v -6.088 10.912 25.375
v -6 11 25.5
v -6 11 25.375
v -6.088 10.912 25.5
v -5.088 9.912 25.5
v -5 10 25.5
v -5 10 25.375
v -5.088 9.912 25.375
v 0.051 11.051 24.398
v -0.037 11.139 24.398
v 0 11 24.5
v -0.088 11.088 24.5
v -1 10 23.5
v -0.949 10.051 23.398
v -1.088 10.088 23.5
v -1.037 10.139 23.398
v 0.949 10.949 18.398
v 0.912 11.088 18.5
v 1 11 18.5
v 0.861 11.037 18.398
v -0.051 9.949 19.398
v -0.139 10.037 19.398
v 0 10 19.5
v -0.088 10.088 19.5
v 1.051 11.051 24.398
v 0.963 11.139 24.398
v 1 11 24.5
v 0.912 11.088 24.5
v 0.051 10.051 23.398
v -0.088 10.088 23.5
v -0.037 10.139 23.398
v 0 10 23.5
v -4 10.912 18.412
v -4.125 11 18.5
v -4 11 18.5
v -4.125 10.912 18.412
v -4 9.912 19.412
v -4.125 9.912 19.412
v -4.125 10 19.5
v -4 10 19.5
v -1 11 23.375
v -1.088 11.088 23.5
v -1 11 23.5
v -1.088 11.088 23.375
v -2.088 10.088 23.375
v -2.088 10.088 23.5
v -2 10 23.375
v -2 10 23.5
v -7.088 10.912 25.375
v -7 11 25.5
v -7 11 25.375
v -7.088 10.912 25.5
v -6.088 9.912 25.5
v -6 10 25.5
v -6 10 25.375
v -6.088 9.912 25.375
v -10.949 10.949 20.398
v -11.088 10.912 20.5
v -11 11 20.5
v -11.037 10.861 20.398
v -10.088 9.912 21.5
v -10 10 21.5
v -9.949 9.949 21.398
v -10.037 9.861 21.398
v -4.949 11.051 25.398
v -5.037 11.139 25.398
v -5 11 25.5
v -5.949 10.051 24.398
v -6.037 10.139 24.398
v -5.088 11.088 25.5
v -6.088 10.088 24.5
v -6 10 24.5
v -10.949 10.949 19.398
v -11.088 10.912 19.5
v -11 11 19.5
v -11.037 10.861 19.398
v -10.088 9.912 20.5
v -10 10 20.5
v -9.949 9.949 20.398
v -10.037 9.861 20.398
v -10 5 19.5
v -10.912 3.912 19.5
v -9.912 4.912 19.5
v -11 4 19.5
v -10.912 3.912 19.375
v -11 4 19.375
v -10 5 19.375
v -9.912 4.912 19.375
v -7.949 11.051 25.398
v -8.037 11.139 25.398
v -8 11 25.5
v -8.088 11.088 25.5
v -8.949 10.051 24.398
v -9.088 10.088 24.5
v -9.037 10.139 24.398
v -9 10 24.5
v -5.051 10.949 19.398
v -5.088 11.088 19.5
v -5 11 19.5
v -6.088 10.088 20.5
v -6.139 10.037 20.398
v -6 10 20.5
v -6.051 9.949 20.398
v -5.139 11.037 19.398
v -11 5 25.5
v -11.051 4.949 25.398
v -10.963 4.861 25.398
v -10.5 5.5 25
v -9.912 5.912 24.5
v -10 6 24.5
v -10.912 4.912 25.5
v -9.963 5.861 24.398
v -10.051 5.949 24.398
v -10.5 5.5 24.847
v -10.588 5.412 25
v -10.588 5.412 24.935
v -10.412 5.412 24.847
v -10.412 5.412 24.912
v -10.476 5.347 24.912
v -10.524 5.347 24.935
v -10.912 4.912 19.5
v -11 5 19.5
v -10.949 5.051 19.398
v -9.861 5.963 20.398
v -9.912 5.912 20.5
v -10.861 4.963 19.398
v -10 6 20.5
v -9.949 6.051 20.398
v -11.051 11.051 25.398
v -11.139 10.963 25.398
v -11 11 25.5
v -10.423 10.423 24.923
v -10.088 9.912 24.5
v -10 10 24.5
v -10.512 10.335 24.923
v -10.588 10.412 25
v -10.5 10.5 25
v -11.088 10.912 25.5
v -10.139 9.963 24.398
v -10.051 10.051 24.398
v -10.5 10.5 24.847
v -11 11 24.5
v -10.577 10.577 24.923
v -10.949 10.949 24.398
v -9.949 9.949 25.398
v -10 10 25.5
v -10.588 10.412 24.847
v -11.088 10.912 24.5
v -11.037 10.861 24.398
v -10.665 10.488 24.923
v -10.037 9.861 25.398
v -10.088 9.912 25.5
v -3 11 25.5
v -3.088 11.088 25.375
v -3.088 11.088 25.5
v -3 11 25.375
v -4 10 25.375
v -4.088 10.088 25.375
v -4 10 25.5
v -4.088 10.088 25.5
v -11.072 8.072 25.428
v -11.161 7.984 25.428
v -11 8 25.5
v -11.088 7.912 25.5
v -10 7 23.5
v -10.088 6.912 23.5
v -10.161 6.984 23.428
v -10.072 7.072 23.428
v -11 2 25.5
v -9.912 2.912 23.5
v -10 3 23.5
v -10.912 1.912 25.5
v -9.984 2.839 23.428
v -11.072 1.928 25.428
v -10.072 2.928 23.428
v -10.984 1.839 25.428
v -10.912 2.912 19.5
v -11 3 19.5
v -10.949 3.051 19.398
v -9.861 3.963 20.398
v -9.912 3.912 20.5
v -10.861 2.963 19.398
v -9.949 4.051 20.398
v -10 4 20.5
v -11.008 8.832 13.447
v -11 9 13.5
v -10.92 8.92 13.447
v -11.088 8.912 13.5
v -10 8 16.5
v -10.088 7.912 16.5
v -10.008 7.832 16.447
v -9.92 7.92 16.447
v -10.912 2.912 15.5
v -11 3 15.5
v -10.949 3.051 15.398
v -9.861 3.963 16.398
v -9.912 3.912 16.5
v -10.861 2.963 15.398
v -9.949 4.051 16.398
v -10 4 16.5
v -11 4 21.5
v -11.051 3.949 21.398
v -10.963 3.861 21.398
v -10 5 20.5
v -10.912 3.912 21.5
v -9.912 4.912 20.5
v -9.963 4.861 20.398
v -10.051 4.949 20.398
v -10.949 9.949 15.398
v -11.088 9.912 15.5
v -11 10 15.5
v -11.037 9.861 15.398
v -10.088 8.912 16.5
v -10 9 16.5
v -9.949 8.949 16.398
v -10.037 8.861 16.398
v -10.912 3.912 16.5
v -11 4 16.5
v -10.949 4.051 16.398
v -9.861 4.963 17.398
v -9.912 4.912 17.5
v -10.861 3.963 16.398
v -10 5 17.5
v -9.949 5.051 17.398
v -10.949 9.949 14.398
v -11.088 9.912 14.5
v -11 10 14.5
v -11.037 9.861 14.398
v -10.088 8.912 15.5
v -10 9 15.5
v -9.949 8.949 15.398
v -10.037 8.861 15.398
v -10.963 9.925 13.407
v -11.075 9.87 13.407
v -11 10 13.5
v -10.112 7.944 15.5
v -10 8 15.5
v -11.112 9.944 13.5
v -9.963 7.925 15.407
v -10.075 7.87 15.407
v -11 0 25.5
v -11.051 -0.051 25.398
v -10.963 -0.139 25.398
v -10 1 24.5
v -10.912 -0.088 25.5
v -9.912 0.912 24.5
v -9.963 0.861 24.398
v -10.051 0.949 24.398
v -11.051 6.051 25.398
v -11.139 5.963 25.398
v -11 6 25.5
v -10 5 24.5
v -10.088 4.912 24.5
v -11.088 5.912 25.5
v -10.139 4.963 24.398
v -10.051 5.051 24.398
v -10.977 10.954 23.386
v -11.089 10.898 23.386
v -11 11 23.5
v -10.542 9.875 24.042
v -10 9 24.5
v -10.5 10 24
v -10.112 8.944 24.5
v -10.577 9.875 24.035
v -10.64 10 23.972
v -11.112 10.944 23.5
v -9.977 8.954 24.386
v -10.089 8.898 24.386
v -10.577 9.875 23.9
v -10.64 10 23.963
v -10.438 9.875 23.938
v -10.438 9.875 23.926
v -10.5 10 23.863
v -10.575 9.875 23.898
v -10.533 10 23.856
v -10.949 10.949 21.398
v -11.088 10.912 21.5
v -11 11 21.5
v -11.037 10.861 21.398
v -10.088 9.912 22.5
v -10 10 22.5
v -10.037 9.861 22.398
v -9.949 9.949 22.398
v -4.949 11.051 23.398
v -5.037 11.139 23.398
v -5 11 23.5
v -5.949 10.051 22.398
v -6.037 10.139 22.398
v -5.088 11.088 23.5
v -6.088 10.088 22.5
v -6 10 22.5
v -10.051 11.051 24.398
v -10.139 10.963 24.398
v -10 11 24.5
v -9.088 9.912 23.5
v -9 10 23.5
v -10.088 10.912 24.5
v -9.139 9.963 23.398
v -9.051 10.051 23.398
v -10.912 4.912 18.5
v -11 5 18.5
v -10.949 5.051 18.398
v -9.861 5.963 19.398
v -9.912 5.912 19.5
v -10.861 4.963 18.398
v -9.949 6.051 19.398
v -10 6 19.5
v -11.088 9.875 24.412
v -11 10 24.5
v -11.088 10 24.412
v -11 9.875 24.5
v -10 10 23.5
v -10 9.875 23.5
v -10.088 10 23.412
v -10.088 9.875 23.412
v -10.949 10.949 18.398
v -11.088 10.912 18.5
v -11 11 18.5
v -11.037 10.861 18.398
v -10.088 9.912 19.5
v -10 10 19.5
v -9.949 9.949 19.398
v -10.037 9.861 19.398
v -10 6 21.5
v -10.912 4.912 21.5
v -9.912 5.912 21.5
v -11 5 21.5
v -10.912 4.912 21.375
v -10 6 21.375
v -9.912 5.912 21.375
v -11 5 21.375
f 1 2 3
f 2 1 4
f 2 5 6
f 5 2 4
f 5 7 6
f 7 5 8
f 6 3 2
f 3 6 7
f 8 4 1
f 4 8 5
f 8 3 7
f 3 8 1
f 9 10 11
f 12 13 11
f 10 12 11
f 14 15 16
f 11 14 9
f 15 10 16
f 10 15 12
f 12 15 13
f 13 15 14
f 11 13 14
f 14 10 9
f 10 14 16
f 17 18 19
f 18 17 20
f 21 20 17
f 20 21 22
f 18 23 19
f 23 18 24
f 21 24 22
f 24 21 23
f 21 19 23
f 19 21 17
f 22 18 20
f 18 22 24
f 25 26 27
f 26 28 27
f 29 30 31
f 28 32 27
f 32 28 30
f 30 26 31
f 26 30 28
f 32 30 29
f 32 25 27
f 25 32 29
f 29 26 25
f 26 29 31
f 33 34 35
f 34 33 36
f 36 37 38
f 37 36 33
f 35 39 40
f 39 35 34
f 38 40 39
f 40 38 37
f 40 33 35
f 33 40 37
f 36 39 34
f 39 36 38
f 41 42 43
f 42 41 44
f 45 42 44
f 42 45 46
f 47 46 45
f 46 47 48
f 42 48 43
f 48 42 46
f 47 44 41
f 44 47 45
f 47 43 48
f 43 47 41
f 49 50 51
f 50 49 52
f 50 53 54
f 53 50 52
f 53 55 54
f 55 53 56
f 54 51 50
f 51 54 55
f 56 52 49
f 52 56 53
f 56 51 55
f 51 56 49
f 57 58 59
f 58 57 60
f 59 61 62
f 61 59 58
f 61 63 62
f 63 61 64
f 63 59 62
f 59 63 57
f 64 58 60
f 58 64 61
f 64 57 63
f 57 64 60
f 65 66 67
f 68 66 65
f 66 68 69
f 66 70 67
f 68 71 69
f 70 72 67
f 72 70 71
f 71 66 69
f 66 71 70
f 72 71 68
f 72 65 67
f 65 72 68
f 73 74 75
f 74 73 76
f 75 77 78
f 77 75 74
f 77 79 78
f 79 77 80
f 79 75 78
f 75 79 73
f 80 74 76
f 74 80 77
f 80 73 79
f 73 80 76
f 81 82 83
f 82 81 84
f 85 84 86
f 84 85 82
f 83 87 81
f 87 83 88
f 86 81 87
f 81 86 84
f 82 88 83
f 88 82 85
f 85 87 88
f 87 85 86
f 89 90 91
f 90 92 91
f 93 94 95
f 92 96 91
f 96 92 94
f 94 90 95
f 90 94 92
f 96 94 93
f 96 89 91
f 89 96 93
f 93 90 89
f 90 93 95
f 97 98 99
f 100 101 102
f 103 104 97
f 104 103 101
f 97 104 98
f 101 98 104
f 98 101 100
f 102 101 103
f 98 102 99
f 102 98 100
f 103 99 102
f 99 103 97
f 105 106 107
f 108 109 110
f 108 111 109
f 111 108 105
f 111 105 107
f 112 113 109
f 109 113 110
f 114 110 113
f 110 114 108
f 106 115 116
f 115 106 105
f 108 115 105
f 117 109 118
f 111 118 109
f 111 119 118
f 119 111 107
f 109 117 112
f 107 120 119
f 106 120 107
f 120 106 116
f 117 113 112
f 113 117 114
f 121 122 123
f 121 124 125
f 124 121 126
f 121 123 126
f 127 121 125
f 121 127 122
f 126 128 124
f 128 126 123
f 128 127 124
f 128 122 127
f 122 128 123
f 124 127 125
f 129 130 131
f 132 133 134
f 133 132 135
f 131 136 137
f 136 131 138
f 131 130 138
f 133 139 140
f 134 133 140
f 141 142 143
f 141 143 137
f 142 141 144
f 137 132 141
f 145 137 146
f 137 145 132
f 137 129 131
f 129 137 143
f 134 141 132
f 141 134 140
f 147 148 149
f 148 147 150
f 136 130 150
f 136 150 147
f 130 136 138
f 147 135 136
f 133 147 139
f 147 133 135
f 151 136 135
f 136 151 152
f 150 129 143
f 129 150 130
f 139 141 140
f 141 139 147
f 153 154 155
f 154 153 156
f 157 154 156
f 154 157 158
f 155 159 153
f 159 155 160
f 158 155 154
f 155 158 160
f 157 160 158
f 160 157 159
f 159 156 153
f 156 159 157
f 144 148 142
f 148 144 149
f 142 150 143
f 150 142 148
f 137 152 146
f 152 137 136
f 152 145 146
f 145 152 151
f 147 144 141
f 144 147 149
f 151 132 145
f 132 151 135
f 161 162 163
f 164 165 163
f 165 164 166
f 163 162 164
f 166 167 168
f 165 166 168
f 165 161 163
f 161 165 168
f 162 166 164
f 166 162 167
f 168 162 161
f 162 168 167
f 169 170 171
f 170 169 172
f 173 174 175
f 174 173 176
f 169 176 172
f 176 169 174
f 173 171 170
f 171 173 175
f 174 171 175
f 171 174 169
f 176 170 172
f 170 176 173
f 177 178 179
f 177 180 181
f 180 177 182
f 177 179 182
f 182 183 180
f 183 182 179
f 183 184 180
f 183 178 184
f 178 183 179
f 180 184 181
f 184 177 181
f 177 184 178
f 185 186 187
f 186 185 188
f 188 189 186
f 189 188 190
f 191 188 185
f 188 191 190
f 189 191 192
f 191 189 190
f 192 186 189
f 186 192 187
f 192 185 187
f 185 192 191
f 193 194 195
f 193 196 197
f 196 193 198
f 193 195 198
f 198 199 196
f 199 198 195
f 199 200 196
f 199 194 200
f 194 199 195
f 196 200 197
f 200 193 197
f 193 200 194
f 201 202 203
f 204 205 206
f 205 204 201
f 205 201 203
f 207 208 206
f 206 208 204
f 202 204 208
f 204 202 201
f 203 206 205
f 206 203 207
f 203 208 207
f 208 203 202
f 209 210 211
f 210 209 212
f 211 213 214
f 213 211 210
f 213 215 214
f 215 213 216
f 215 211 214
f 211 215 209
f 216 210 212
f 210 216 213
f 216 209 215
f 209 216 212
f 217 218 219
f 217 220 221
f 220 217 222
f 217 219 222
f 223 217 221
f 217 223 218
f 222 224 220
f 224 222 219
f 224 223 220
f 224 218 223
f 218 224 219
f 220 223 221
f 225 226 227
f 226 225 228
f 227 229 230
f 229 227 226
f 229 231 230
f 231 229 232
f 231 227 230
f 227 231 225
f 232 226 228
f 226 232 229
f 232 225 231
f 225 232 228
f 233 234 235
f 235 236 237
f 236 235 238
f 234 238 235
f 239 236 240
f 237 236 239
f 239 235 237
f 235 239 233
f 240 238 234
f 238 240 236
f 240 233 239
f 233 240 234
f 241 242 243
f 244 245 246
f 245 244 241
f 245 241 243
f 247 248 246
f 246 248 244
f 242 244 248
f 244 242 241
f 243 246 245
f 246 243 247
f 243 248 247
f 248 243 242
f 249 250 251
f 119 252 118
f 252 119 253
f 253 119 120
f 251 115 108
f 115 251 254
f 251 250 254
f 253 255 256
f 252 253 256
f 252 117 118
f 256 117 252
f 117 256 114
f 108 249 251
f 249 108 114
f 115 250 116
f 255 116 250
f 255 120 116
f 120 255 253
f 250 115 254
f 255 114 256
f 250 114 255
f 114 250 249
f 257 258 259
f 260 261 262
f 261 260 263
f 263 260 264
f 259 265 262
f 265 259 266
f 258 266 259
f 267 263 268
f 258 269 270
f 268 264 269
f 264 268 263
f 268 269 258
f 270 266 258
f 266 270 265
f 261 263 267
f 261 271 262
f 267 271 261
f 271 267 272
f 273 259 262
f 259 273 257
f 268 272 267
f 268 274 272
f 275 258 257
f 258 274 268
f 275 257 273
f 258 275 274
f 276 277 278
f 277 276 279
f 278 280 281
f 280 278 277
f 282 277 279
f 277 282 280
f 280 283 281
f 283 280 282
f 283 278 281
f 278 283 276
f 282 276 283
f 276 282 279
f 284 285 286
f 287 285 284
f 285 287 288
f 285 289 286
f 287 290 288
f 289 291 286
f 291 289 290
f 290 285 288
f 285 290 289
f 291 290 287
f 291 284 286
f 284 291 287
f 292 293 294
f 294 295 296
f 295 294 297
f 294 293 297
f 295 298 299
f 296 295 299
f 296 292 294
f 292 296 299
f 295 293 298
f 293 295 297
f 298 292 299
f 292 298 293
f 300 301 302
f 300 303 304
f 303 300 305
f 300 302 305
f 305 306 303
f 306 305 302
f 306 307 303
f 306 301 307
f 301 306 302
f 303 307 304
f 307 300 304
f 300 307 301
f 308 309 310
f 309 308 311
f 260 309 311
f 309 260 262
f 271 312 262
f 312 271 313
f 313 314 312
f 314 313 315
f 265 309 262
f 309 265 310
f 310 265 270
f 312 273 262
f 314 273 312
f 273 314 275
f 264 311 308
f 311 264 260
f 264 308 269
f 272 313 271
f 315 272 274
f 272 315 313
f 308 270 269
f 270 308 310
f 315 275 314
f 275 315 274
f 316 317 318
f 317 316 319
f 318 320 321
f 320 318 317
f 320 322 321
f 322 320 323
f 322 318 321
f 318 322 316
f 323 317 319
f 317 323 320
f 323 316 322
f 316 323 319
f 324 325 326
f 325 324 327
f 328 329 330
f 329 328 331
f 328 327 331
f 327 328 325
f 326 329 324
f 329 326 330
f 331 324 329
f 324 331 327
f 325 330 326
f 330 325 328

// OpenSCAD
translate(v = [-0.5, -0.5, 0]) {
	/*Shell 0*/
	union() {
		%/*Nodes shell 0*/
		union();
		/*Edges shell 0*/
		union();
	}
	/*Shell 1*/
	union() {
		%/*Nodes shell 1*/
		union() {
			/*Node thingy.ctrl_stage_in_hole*/
			color(alpha = 0.1, c = "green") {
				translate(v = [0, -3, -3]) {
					cube(size = [1, 1, 1]);
				}
			}
			/*Node thingy.ctrl_stage_out_hole*/
			color(alpha = 0.1, c = "green") {
				translate(v = [-3, -3, -3]) {
					cube(size = [1, 1, 1]);
				}
			}
			/*Node thingy.flush_stage_in_hole*/
			color(alpha = 0.1, c = "lightgreen") {
				translate(v = [-1, -3, 1]) {
					cube(size = [1, 1, 1]);
				}
			}
			/*Node thingy.flush_stage_out_hole*/
			color(alpha = 0.1, c = "lightgreen") {
				translate(v = [-3, 0, -7]) {
					cube(size = [1, 1, 1]);
				}
			}
			/*Node $_238__1*/
			color(alpha = 0.1, c = "lightblue") {
				translate(v = [3, -3, -1]) {
					cube(size = [1, 1, 1]);
				}
			}
			/*Node $_228__1*/
			color(alpha = 0.1, c = "lightblue") {
				translate(v = [-3, -3, 10]) {
					cube(size = [1, 1, 1]);
				}
			}
			/*Node $_224__1*/
			color(alpha = 0.1, c = "lightblue") {
				translate(v = [0, 3, -5]) {
					cube(size = [1, 1, 1]);
				}
			}
			/*Node $_68__1*/
			color(alpha = 0.1, c = "lightblue") {
				translate(v = [-3, -3, -4]) {
					cube(size = [1, 1, 1]);
				}
			}
			/*Node $_257__1*/
			color(alpha = 0.1, c = "lightblue") {
				translate(v = [3, -1, 0]) {
					cube(size = [1, 1, 1]);
				}
			}
			/*Node thingy.thingy.chamber[7].first.ring__1*/
			color(alpha = 0.1, c = "lightblue") {
				translate(v = [-2, -3, -5]) {
					cube(size = [1, 1, 1]);
				}
			}
			/*Node $_204__1*/
			color(alpha = 0.1, c = "lightblue") {
				translate(v = [-2, 3, 6]) {
					cube(size = [1, 1, 1]);
				}
			}
			/*Node $_300__1*/
			color(alpha = 0.1, c = "lightblue") {
				translate(v = [-2, -3, 0]) {
					cube(size = [1, 1, 1]);
				}
			}
			/*Node $_190__1*/
			color(alpha = 0.1, c = "lightblue") {
				translate(v = [-3, 3, 6]) {
					cube(size = [1, 1, 1]);
				}
			}
			/*Node $_287__1*/
			color(alpha = 0.1, c = "lightblue") {
				translate(v = [-3, -3, 1]) {
					cube(size = [1, 1, 1]);
				}
			}
			/*Node $_54__1*/
			color(alpha = 0.1, c = "lightblue") {
				translate(v = [-1, -3, -6]) {
					cube(size = [1, 1, 1]);
				}
			}
			/*Node $_242__1*/
			color(alpha = 0.1, c = "lightblue") {
				translate(v = [-1, 3, 5]) {
					cube(size = [1, 1, 1]);
				}
			}
			/*Node $_82__1*/
			color(alpha = 0.1, c = "lightblue") {
				translate(v = [-3, -3, 0]) {
					cube(size = [1, 1, 1]);
				}
			}
			/*Node $_236__1*/
			color(alpha = 0.1, c = "lightblue") {
				translate(v = [-3, 3, 0]) {
					cube(size = [1, 1, 1]);
				}
			}
			/*Node thingy.thingy.chamber[9].first.ring__1*/
			color(alpha = 0.1, c = "lightblue") {
				translate(v = [-3, 3, -2]) {
					cube(size = [1, 1, 1]);
				}
			}
			/*Node thingy.thingy.chamber[6].first.ring__1*/
			color(alpha = 0.1, c = "lightblue") {
				translate(v = [-2, -3, 2]) {
					cube(size = [1, 1, 1]);
				}
			}
			/*Node $_44__1*/
			color(alpha = 0.1, c = "lightblue") {
				translate(v = [3, 2, -2]) {
					cube(size = [1, 1, 1]);
				}
			}
			/*Node $_306__1*/
			color(alpha = 0.1, c = "lightblue") {
				translate(v = [-3, 0, -5]) {
					cube(size = [1, 1, 1]);
				}
			}
			/*Node $_222__1*/
			color(alpha = 0.1, c = "lightblue") {
				translate(v = [-3, -3, 7]) {
					cube(size = [1, 1, 1]);
				}
			}
			/*Node $_260__1*/
			color(alpha = 0.1, c = "lightblue") {
				translate(v = [-3, -2, 6]) {
					cube(size = [1, 1, 1]);
				}
			}
			/*Node $_63__1*/
			color(alpha = 0.1, c = "lightblue") {
				translate(v = [0, 3, -6]) {
					cube(size = [1, 1, 1]);
				}
			}
			/*Node $_51__1*/
			color(alpha = 0.1, c = "lightblue") {
				translate(v = [-1, 3, 1]) {
					cube(size = [1, 1, 1]);
				}
			}
			/*Node $_297__1*/
			color(alpha = 0.1, c = "lightblue") {
				translate(v = [-3, -3, -17]) {
					cube(size = [1, 1, 1]);
				}
			}
			/*Node $_321__1*/
			color(alpha = 0.1, c = "lightblue") {
				translate(v = [1, -3, -3]) {
					cube(size = [1, 1, 1]);
				}
			}
			/*Node $_176__1*/
			color(alpha = 0.1, c = "lightblue") {
				translate(v = [0, -3, 1]) {
					cube(size = [1, 1, 1]);
				}
			}
			/*Node $_64__1*/
			color(alpha = 0.1, c = "lightblue") {
				translate(v = [-2, -3, -14]) {
					cube(size = [1, 1, 1]);
				}
			}
			/*Node $_273__1*/
			color(alpha = 0.1, c = "lightblue") {
				translate(v = [-1, -3, -2]) {
					cube(size = [1, 1, 1]);
				}
			}
			/*Node $_40__1*/
			color(alpha = 0.1, c = "lightblue") {
				translate(v = [3, -3, -14]) {
					cube(size = [1, 1, 1]);
				}
			}
			/*Node $_258__1*/
			color(alpha = 0.1, c = "lightblue") {
				translate(v = [-3, 1, 2]) {
					cube(size = [1, 1, 1]);
				}
			}
			/*Node $_83__1*/
			color(alpha = 0.1, c = "lightblue") {
				translate(v = [-3, -3, -7]) {
					cube(size = [1, 1, 1]);
				}
			}
			/*Node $_267__1*/
			color(alpha = 0.1, c = "lightblue") {
				translate(v = [3, -3, 7]) {
					cube(size = [1, 1, 1]);
				}
			}
			/*Node thingy.thingy.chamber[4].first.ring__1*/
			color(alpha = 0.1, c = "lightblue") {
				translate(v = [-3, -3, -1]) {
					cube(size = [1, 1, 1]);
				}
			}
			/*Node $_304__1*/
			color(alpha = 0.1, c = "lightblue") {
				translate(v = [-3, 3, 1]) {
					cube(size = [1, 1, 1]);
				}
			}
			/*Node $_41__1*/
			color(alpha = 0.1, c = "lightblue") {
				translate(v = [3, 0, -18]) {
					cube(size = [1, 1, 1]);
				}
			}
			/*Node $_231__1*/
			color(alpha = 0.1, c = "lightblue") {
				translate(v = [-3, -2, -4]) {
					cube(size = [1, 1, 1]);
				}
			}
			/*Node $_74__1*/
			color(alpha = 0.1, c = "lightblue") {
				translate(v = [3, -3, -17]) {
					cube(size = [1, 1, 1]);
				}
			}
			/*Node $_201__1*/
			color(alpha = 0.1, c = "lightblue") {
				translate(v = [-2, 3, 0]) {
					cube(size = [1, 1, 1]);
				}
			}
			/*Node $_81__1*/
			color(alpha = 0.1, c = "lightblue") {
				translate(v = [0, 3, -7]) {
					cube(size = [1, 1, 1]);
				}
			}
			/*Node $_58__1*/
			color(alpha = 0.1, c = "lightblue") {
				translate(v = [-3, 3, -11]) {
					cube(size = [1, 1, 1]);
				}
			}
			/*Node $_225__1*/
			color(alpha = 0.1, c = "lightblue") {
				translate(v = [-1, 3, 3]) {
					cube(size = [1, 1, 1]);
				}
			}
			/*Node $_247__1*/
			color(alpha = 0.1, c = "lightblue") {
				translate(v = [-3, 3, -6]) {
					cube(size = [1, 1, 1]);
				}
			}
			/*Node $_47__1*/
			color(alpha = 0.1, c = "lightblue") {
				translate(v = [-3, -3, -9]) {
					cube(size = [1, 1, 1]);
				}
			}
			/*Node thingy.thingy.chamber[8].first.ring__1*/
			color(alpha = 0.1, c = "lightblue") {
				translate(v = [-3, -2, -5]) {
					cube(size = [1, 1, 1]);
				}
			}
			/*Node $_42__1*/
			color(alpha = 0.1, c = "lightblue") {
				translate(v = [0, -3, -2]) {
					cube(size = [1, 1, 1]);
				}
			}
			/*Node $_55__1*/
			color(alpha = 0.1, c = "lightblue") {
				translate(v = [-3, -3, 3]) {
					cube(size = [1, 1, 1]);
				}
			}
			/*Node $_178__1*/
			color(alpha = 0.1, c = "lightblue") {
				translate(v = [-3, 0, 1]) {
					cube(size = [1, 1, 1]);
				}
			}
			/*Node $_219__1*/
			color(alpha = 0.1, c = "lightblue") {
				translate(v = [-3, -3, 8]) {
					cube(size = [1, 1, 1]);
				}
			}
			/*Node $_52__1*/
			color(alpha = 0.1, c = "lightblue") {
				translate(v = [-1, -3, -5]) {
					cube(size = [1, 1, 1]);
				}
			}
			/*Node $_171__1*/
			color(alpha = 0.1, c = "lightblue") {
				translate(v = [3, 3, 6]) {
					cube(size = [1, 1, 1]);
				}
			}
			/*Node $_295__1*/
			color(alpha = 0.1, c = "lightblue") {
				translate(v = [-3, -2, -7]) {
					cube(size = [1, 1, 1]);
				}
			}
			/*Node $_215__1*/
			color(alpha = 0.1, c = "lightblue") {
				translate(v = [-3, 3, 7]) {
					cube(size = [1, 1, 1]);
				}
			}
			/*Node $_170__1*/
			color(alpha = 0.1, c = "lightblue") {
				translate(v = [0, 3, 3]) {
					cube(size = [1, 1, 1]);
				}
			}
			/*Node $_233__1*/
			color(alpha = 0.1, c = "lightblue") {
				translate(v = [-2, -3, 12]) {
					cube(size = [1, 1, 1]);
				}
			}
			/*Node $_272__1*/
			color(alpha = 0.1, c = "lightblue") {
				translate(v = [0, -3, -6]) {
					cube(size = [1, 1, 1]);
				}
			}
			/*Node $_180__1*/
			color(alpha = 0.1, c = "lightblue") {
				translate(v = [-3, 0, -2]) {
					cube(size = [1, 1, 1]);
				}
			}
			/*Node $_235__1*/
			color(alpha = 0.1, c = "lightblue") {
				translate(v = [0, 3, 9]) {
					cube(size = [1, 1, 1]);
				}
			}
			/*Node $_77__1*/
			color(alpha = 0.1, c = "lightblue") {
				translate(v = [3, -3, -7]) {
					cube(size = [1, 1, 1]);
				}
			}
			/*Node $_249__1*/
			color(alpha = 0.1, c = "lightblue") {
				translate(v = [0, -3, 0]) {
					cube(size = [1, 1, 1]);
				}
			}
			/*Node $_79__1*/
			color(alpha = 0.1, c = "lightblue") {
				translate(v = [-3, -3, -2]) {
					cube(size = [1, 1, 1]);
				}
			}
			/*Node $_53__1*/
			color(alpha = 0.1, c = "lightblue") {
				translate(v = [-1, -3, -9]) {
					cube(size = [1, 1, 1]);
				}
			}
			/*Node $_199__1*/
			color(alpha = 0.1, c = "lightblue") {
				translate(v = [-3, 3, -5]) {
					cube(size = [1, 1, 1]);
				}
			}
			/*Node $_166__1*/
			color(alpha = 0.1, c = "lightblue") {
				translate(v = [3, 3, 4]) {
					cube(size = [1, 1, 1]);
				}
			}
			/*Node $_62__1*/
			color(alpha = 0.1, c = "lightblue") {
				translate(v = [-3, -2, -2]) {
					cube(size = [1, 1, 1]);
				}
			}
			/*Node $_286__1*/
			color(alpha = 0.1, c = "lightblue") {
				translate(v = [2, -3, 3]) {
					cube(size = [1, 1, 1]);
				}
			}
			/*Node $_290__1*/
			color(alpha = 0.1, c = "lightblue") {
				translate(v = [-3, -3, -5]) {
					cube(size = [1, 1, 1]);
				}
			}
			/*Node $_65__1*/
			color(alpha = 0.1, c = "lightblue") {
				translate(v = [-1, -3, -15]) {
					cube(size = [1, 1, 1]);
				}
			}
			/*Node $_239__1*/
			color(alpha = 0.1, c = "lightblue") {
				translate(v = [3, -3, 5]) {
					cube(size = [1, 1, 1]);
				}
			}
			/*Node $_226__1*/
			color(alpha = 0.1, c = "lightblue") {
				translate(v = [3, 3, 2]) {
					cube(size = [1, 1, 1]);
				}
			}
			/*Node thingy.thingy.chamber[2].first.ring__1*/
			color(alpha = 0.1, c = "lightblue") {
				translate(v = [-3, -3, 6]) {
					cube(size = [1, 1, 1]);
				}
			}
			/*Node $_240__1*/
			color(alpha = 0.1, c = "lightblue") {
				translate(v = [3, 1, 3]) {
					cube(size = [1, 1, 1]);
				}
			}
			/*Node $_289__1*/
			color(alpha = 0.1, c = "lightblue") {
				translate(v = [-1, -3, -3]) {
					cube(size = [1, 1, 1]);
				}
			}
			/*Node $_80__1*/
			color(alpha = 0.1, c = "lightblue") {
				translate(v = [-2, -3, -11]) {
					cube(size = [1, 1, 1]);
				}
			}
			/*Node $_256__1*/
			color(alpha = 0.1, c = "lightblue") {
				translate(v = [0, 3, 2]) {
					cube(size = [1, 1, 1]);
				}
			}
			/*Node $_288__1*/
			color(alpha = 0.1, c = "lightblue") {
				translate(v = [-2, -3, -7]) {
					cube(size = [1, 1, 1]);
				}
			}
			/*Node $_67__1*/
			color(alpha = 0.1, c = "lightblue") {
				translate(v = [-3, -2, -14]) {
					cube(size = [1, 1, 1]);
				}
			}
			/*Node $_320__1*/
			color(alpha = 0.1, c = "lightblue") {
				translate(v = [-1, -3, -1]) {
					cube(size = [1, 1, 1]);
				}
			}
			/*Node $_177__1*/
			color(alpha = 0.1, c = "lightblue") {
				translate(v = [3, 1, 1]) {
					cube(size = [1, 1, 1]);
				}
			}
			/*Node $_283__1*/
			color(alpha = 0.1, c = "lightblue") {
				translate(v = [-2, 3, 7]) {
					cube(size = [1, 1, 1]);
				}
			}
			/*Node $_305__1*/
			color(alpha = 0.1, c = "lightblue") {
				translate(v = [2, -3, -3]) {
					cube(size = [1, 1, 1]);
				}
			}
			/*Node $_274__1*/
			color(alpha = 0.1, c = "lightblue") {
				translate(v = [-2, -3, -2]) {
					cube(size = [1, 1, 1]);
				}
			}
			/*Node $_254__1*/
			color(alpha = 0.1, c = "lightblue") {
				translate(v = [0, 3, 5]) {
					cube(size = [1, 1, 1]);
				}
			}
			/*Node $_73__1*/
			color(alpha = 0.1, c = "lightblue") {
				translate(v = [-3, 0, -13]) {
					cube(size = [1, 1, 1]);
				}
			}
			/*Node $_168__1*/
			color(alpha = 0.1, c = "lightblue") {
				translate(v = [0, -3, 7]) {
					cube(size = [1, 1, 1]);
				}
			}
			/*Node $_308__1*/
			color(alpha = 0.1, c = "lightblue") {
				translate(v = [-3, -3, -13]) {
					cube(size = [1, 1, 1]);
				}
			}
			/*Node $_174__1*/
			color(alpha = 0.1, c = "lightblue") {
				translate(v = [3, 3, -3]) {
					cube(size = [1, 1, 1]);
				}
			}
			/*Node $_191__1*/
			color(alpha = 0.1, c = "lightblue") {
				translate(v = [3, 3, 1]) {
					cube(size = [1, 1, 1]);
				}
			}
			/*Node $_255__1*/
			color(alpha = 0.1, c = "lightblue") {
				translate(v = [3, -3, 2]) {
					cube(size = [1, 1, 1]);
				}
			}
			/*Node $_241__1*/
			color(alpha = 0.1, c = "lightblue") {
				translate(v = [-1, 3, -1]) {
					cube(size = [1, 1, 1]);
				}
			}
			/*Node $_66__1*/
			color(alpha = 0.1, c = "lightblue") {
				translate(v = [-1, -3, -14]) {
					cube(size = [1, 1, 1]);
				}
			}
			/*Node $_193__1*/
			color(alpha = 0.1, c = "lightblue") {
				translate(v = [3, 1, 4]) {
					cube(size = [1, 1, 1]);
				}
			}
			/*Node $_57__1*/
			color(alpha = 0.1, c = "lightblue") {
				translate(v = [-3, -1, -14]) {
					cube(size = [1, 1, 1]);
				}
			}
			/*Node $_208__1*/
			color(alpha = 0.1, c = "lightblue") {
				translate(v = [0, -3, -1]) {
					cube(size = [1, 1, 1]);
				}
			}
			/*Node $_244__1*/
			color(alpha = 0.1, c = "lightblue") {
				translate(v = [3, -3, 10]) {
					cube(size = [1, 1, 1]);
				}
			}
			/*Node $_43__1*/
			color(alpha = 0.1, c = "lightblue") {
				translate(v = [-2, -3, -3]) {
					cube(size = [1, 1, 1]);
				}
			}
			/*Node $_196__1*/
			color(alpha = 0.1, c = "lightblue") {
				translate(v = [0, 3, -2]) {
					cube(size = [1, 1, 1]);
				}
			}
			/*Node $_46__1*/
			color(alpha = 0.1, c = "lightblue") {
				translate(v = [0, -3, -4]) {
					cube(size = [1, 1, 1]);
				}
			}
			/*Node thingy.thingy.chamber[0].first.ring__1*/
			color(alpha = 0.1, c = "lightblue") {
				translate(v = [-3, -1, -5]) {
					cube(size = [1, 1, 1]);
				}
			}
			/*Node $_175__1*/
			color(alpha = 0.1, c = "lightblue") {
				translate(v = [-2, -3, 3]) {
					cube(size = [1, 1, 1]);
				}
			}
			/*Node $_76__1*/
			color(alpha = 0.1, c = "lightblue") {
				translate(v = [-1, 3, -11]) {
					cube(size = [1, 1, 1]);
				}
			}
			/*Node thingy.thingy.chamber[3].first.ring__1*/
			color(alpha = 0.1, c = "lightblue") {
				translate(v = [-3, -2, 3]) {
					cube(size = [1, 1, 1]);
				}
			}
			/*Node $_292__1*/
			color(alpha = 0.1, c = "lightblue") {
				translate(v = [-1, -3, -7]) {
					cube(size = [1, 1, 1]);
				}
			}
			/*Node $_59__1*/
			color(alpha = 0.1, c = "lightblue") {
				translate(v = [-3, -3, 2]) {
					cube(size = [1, 1, 1]);
				}
			}
			/*Node $_284__1*/
			color(alpha = 0.1, c = "lightblue") {
				translate(v = [-1, -3, -11]) {
					cube(size = [1, 1, 1]);
				}
			}
			/*Node $_60__1*/
			color(alpha = 0.1, c = "lightblue") {
				translate(v = [-3, 0, -3]) {
					cube(size = [1, 1, 1]);
				}
			}
			/*Node $_48__1*/
			color(alpha = 0.1, c = "lightblue") {
				translate(v = [-1, -3, -4]) {
					cube(size = [1, 1, 1]);
				}
			}
			/*Node $_303__1*/
			color(alpha = 0.1, c = "lightblue") {
				translate(v = [-3, -2, 1]) {
					cube(size = [1, 1, 1]);
				}
			}
			/*Node $_210__1*/
			color(alpha = 0.1, c = "lightblue") {
				translate(v = [0, 3, 6]) {
					cube(size = [1, 1, 1]);
				}
			}
			/*Node $_281__1*/
			color(alpha = 0.1, c = "lightblue") {
				translate(v = [3, -2, -6]) {
					cube(size = [1, 1, 1]);
				}
			}
			/*Node $_183__1*/
			color(alpha = 0.1, c = "lightblue") {
				translate(v = [-3, 3, -3]) {
					cube(size = [1, 1, 1]);
				}
			}
			/*Node $_173__1*/
			color(alpha = 0.1, c = "lightblue") {
				translate(v = [3, -3, 3]) {
					cube(size = [1, 1, 1]);
				}
			}
			/*Node $_212__1*/
			color(alpha = 0.1, c = "lightblue") {
				translate(v = [3, -3, 6]) {
					cube(size = [1, 1, 1]);
				}
			}
			/*Node $_61__1*/
			color(alpha = 0.1, c = "lightblue") {
				translate(v = [3, 0, 3]) {
					cube(size = [1, 1, 1]);
				}
			}
			/*Node $_265__1*/
			color(alpha = 0.1, c = "lightblue") {
				translate(v = [-2, -3, -6]) {
					cube(size = [1, 1, 1]);
				}
			}
			/*Node $_270__1*/
			color(alpha = 0.1, c = "lightblue") {
				translate(v = [3, -3, 1]) {
					cube(size = [1, 1, 1]);
				}
			}
			/*Node $_251__1*/
			color(alpha = 0.1, c = "lightblue") {
				translate(v = [3, 3, 10]) {
					cube(size = [1, 1, 1]);
				}
			}
			/*Node $_217__1*/
			color(alpha = 0.1, c = "lightblue") {
				translate(v = [-3, -3, 12]) {
					cube(size = [1, 1, 1]);
				}
			}
			/*Node $_187__1*/
			color(alpha = 0.1, c = "lightblue") {
				translate(v = [3, 3, -5]) {
					cube(size = [1, 1, 1]);
				}
			}
			/*Node $_206__1*/
			color(alpha = 0.1, c = "lightblue") {
				translate(v = [-1, -3, 0]) {
					cube(size = [1, 1, 1]);
				}
			}
			/*Node $_188__1*/
			color(alpha = 0.1, c = "lightblue") {
				translate(v = [-3, 3, 5]) {
					cube(size = [1, 1, 1]);
				}
			}
			/*Node $_45__1*/
			color(alpha = 0.1, c = "lightblue") {
				translate(v = [-3, -3, -14]) {
					cube(size = [1, 1, 1]);
				}
			}
			/*Node $_207__1*/
			color(alpha = 0.1, c = "lightblue") {
				translate(v = [0, 3, -3]) {
					cube(size = [1, 1, 1]);
				}
			}
			/*Node $_279__1*/
			color(alpha = 0.1, c = "lightblue") {
				translate(v = [3, -3, -2]) {
					cube(size = [1, 1, 1]);
				}
			}
			/*Node $_252__1*/
			color(alpha = 0.1, c = "lightblue") {
				translate(v = [-2, -3, 1]) {
					cube(size = [1, 1, 1]);
				}
			}
			/*Node $_299__1*/
			color(alpha = 0.1, c = "lightblue") {
				translate(v = [3, -3, -5]) {
					cube(size = [1, 1, 1]);
				}
			}
			/*Node $_69__1*/
			color(alpha = 0.1, c = "lightblue") {
				translate(v = [-1, -3, -8]) {
					cube(size = [1, 1, 1]);
				}
			}
			/*Node $_223__1*/
			color(alpha = 0.1, c = "lightblue") {
				translate(v = [3, -3, 4]) {
					cube(size = [1, 1, 1]);
				}
			}
			/*Node $_271__1*/
			color(alpha = 0.1, c = "lightblue") {
				translate(v = [3, 3, -2]) {
					cube(size = [1, 1, 1]);
				}
			}
			/*Node $_276__1*/
			color(alpha = 0.1, c = "lightblue") {
				translate(v = [3, 0, 1]) {
					cube(size = [1, 1, 1]);
				}
			}
			/*Node thingy.thingy.chamber[5].first.ring__1*/
			color(alpha = 0.1, c = "lightblue") {
				translate(v = [-3, -3, 5]) {
					cube(size = [1, 1, 1]);
				}
			}
			/*Node $_194__1*/
			color(alpha = 0.1, c = "lightblue") {
				translate(v = [1, 3, 3]) {
					cube(size = [1, 1, 1]);
				}
			}
			/*Node thingy.thingy.chamber[1].first.ring__1*/
			color(alpha = 0.1, c = "lightblue") {
				translate(v = [-3, -2, 7]) {
					cube(size = [1, 1, 1]);
				}
			}
			/*Node $_70__1*/
			color(alpha = 0.1, c = "lightblue") {
				translate(v = [-3, -1, -7]) {
					cube(size = [1, 1, 1]);
				}
			}
			/*Node $_192__1*/
			color(alpha = 0.1, c = "lightblue") {
				translate(v = [0, 3, 7]) {
					cube(size = [1, 1, 1]);
				}
			}
			/*Node $_302__1*/
			color(alpha = 0.1, c = "lightblue") {
				translate(v = [-3, -1, -4]) {
					cube(size = [1, 1, 1]);
				}
			}
			/*Node $_75__1*/
			color(alpha = 0.1, c = "lightblue") {
				translate(v = [2, -3, 5]) {
					cube(size = [1, 1, 1]);
				}
			}
			/*Node $_268__1*/
			color(alpha = 0.1, c = "lightblue") {
				translate(v = [3, -3, -10]) {
					cube(size = [1, 1, 1]);
				}
			}
			/*Node $_220__1*/
			color(alpha = 0.1, c = "lightblue") {
				translate(v = [3, -3, -6]) {
					cube(size = [1, 1, 1]);
				}
			}
			/*Node $_203__1*/
			color(alpha = 0.1, c = "lightblue") {
				translate(v = [2, -3, -4]) {
					cube(size = [1, 1, 1]);
				}
			}
			/*Node $_209__1*/
			color(alpha = 0.1, c = "lightblue") {
				translate(v = [-1, 3, 0]) {
					cube(size = [1, 1, 1]);
				}
			}
			/*Node $_263__1*/
			color(alpha = 0.1, c = "lightblue") {
				translate(v = [0, -3, 6]) {
					cube(size = [1, 1, 1]);
				}
			}
			/*Node $_185__1*/
			color(alpha = 0.1, c = "lightblue") {
				translate(v = [0, 3, 1]) {
					cube(size = [1, 1, 1]);
				}
			}
			/*Node thingy.thingy.prep.ring__1*/
			color(alpha = 0.1, c = "lightblue") {
				translate(v = [0, -3, -5]) {
					cube(size = [1, 1, 1]);
				}
			}
		}
		/*Edges shell 1*/
		union();
	}
	/*Shell 2*/
	union() {
		%/*Nodes shell 2*/
		union();
		/*Edges shell 2*/
		union();
	}
	/*Shell 3*/
	union() {
		%/*Nodes shell 3*/
		union();
		/*Edges shell 3*/
		union();
	}
	/*Shell 4*/
	union() {
		%/*Nodes shell 4*/
		union();
		/*Edges shell 4*/
		union();
	}
	/*Shell 5*/
	union() {
		%/*Nodes shell 5*/
		union();
		/*Edges shell 5*/
		union();
	}
	/*Shell 6*/
	union() {
		%/*Nodes shell 6*/
		union();
		/*Edges shell 6*/
		union();
	}
	/*Shell 7*/
	union() {
		%/*Nodes shell 7*/
		union();
		/*Edges shell 7*/
		union();
	}
	/*Shell 8*/
	union() {
		%/*Nodes shell 8*/
		union() {
			/*Node $_84*/
			color(alpha = 0.1, c = "pink") {
				translate(v = [-5, 10, 25]) {
					cube(size = [1, 1, 1]);
				}
			}
			/*Node $_85*/
			color(alpha = 0.1, c = "pink") {
				translate(v = [-1, 10, 23]) {
					cube(size = [1, 1, 1]);
				}
			}
			/*Node $_86*/
			color(alpha = 0.1, c = "pink") {
				translate(v = [0, 10, 19]) {
					cube(size = [1, 1, 1]);
				}
			}
			/*Node $_87*/
			color(alpha = 0.1, c = "pink") {
				translate(v = [0, 10, 23]) {
					cube(size = [1, 1, 1]);
				}
			}
			/*Node $_88*/
			color(alpha = 0.1, c = "pink") {
				translate(v = [-4, 10, 19]) {
					cube(size = [1, 1, 1]);
				}
			}
			/*Node $_89*/
			color(alpha = 0.1, c = "pink") {
				translate(v = [-2, 10, 23]) {
					cube(size = [1, 1, 1]);
				}
			}
			/*Node $_90*/
			color(alpha = 0.1, c = "pink") {
				translate(v = [-6, 10, 25]) {
					cube(size = [1, 1, 1]);
				}
			}
			/*Node $_91*/
			color(alpha = 0.1, c = "pink") {
				translate(v = [-10, 10, 21]) {
					cube(size = [1, 1, 1]);
				}
			}
			/*Node $_92*/
			color(alpha = 0.1, c = "pink") {
				translate(v = [-6, 10, 24]) {
					cube(size = [1, 1, 1]);
				}
			}
			/*Node $_93*/
			color(alpha = 0.1, c = "pink") {
				translate(v = [-10, 10, 20]) {
					cube(size = [1, 1, 1]);
				}
			}
			/*Node $_133*/
			color(alpha = 0.1, c = "pink") {
				translate(v = [-10, 5, 19]) {
					cube(size = [1, 1, 1]);
				}
			}
			/*Node $_134*/
			color(alpha = 0.1, c = "pink") {
				translate(v = [-9, 10, 24]) {
					cube(size = [1, 1, 1]);
				}
			}
			/*Node $_135*/
			color(alpha = 0.1, c = "pink") {
				translate(v = [-6, 10, 20]) {
					cube(size = [1, 1, 1]);
				}
			}
			/*Node $_136*/
			color(alpha = 0.1, c = "pink") {
				translate(v = [-10, 6, 24]) {
					cube(size = [1, 1, 1]);
				}
			}
			/*Node $_137*/
			color(alpha = 0.1, c = "pink") {
				translate(v = [-10, 6, 20]) {
					cube(size = [1, 1, 1]);
				}
			}
			/*Node $_138*/
			color(alpha = 0.1, c = "pink") {
				translate(v = [-10, 10, 24]) {
					cube(size = [1, 1, 1]);
				}
			}
			/*Node $_139*/
			color(alpha = 0.1, c = "pink") {
				translate(v = [-4, 10, 25]) {
					cube(size = [1, 1, 1]);
				}
			}
			/*Node $_140*/
			color(alpha = 0.1, c = "pink") {
				translate(v = [-10, 10, 25]) {
					cube(size = [1, 1, 1]);
				}
			}
			/*Node $_144*/
			color(alpha = 0.1, c = "pink") {
				translate(v = [-10, 7, 23]) {
					cube(size = [1, 1, 1]);
				}
			}
			/*Node $_145*/
			color(alpha = 0.1, c = "pink") {
				translate(v = [-10, 3, 23]) {
					cube(size = [1, 1, 1]);
				}
			}
			/*Node $_146*/
			color(alpha = 0.1, c = "pink") {
				translate(v = [-10, 4, 20]) {
					cube(size = [1, 1, 1]);
				}
			}
			/*Node $_147*/
			color(alpha = 0.1, c = "pink") {
				translate(v = [-10, 8, 16]) {
					cube(size = [1, 1, 1]);
				}
			}
			/*Node $_148*/
			color(alpha = 0.1, c = "pink") {
				translate(v = [-10, 4, 16]) {
					cube(size = [1, 1, 1]);
				}
			}
			/*Node $_149*/
			color(alpha = 0.1, c = "pink") {
				translate(v = [-10, 5, 20]) {
					cube(size = [1, 1, 1]);
				}
			}
			/*Node $_150*/
			color(alpha = 0.1, c = "pink") {
				translate(v = [-10, 9, 16]) {
					cube(size = [1, 1, 1]);
				}
			}
			/*Node $_151*/
			color(alpha = 0.1, c = "pink") {
				translate(v = [-10, 5, 17]) {
					cube(size = [1, 1, 1]);
				}
			}
			/*Node $_152*/
			color(alpha = 0.1, c = "pink") {
				translate(v = [-10, 9, 15]) {
					cube(size = [1, 1, 1]);
				}
			}
			/*Node $_153*/
			color(alpha = 0.1, c = "pink") {
				translate(v = [-10, 8, 15]) {
					cube(size = [1, 1, 1]);
				}
			}
			/*Node $_154*/
			color(alpha = 0.1, c = "pink") {
				translate(v = [-10, 1, 24]) {
					cube(size = [1, 1, 1]);
				}
			}
			/*Node $_155*/
			color(alpha = 0.1, c = "pink") {
				translate(v = [-10, 5, 24]) {
					cube(size = [1, 1, 1]);
				}
			}
			/*Node $_156*/
			color(alpha = 0.1, c = "pink") {
				translate(v = [-10, 9, 24]) {
					cube(size = [1, 1, 1]);
				}
			}
			/*Node $_157*/
			color(alpha = 0.1, c = "pink") {
				translate(v = [-10, 10, 22]) {
					cube(size = [1, 1, 1]);
				}
			}
			/*Node $_158*/
			color(alpha = 0.1, c = "pink") {
				translate(v = [-6, 10, 22]) {
					cube(size = [1, 1, 1]);
				}
			}
			/*Node $_159*/
			color(alpha = 0.1, c = "pink") {
				translate(v = [-9, 10, 23]) {
					cube(size = [1, 1, 1]);
				}
			}
			/*Node $_160*/
			color(alpha = 0.1, c = "pink") {
				translate(v = [-10, 6, 19]) {
					cube(size = [1, 1, 1]);
				}
			}
			/*Node $_161*/
			color(alpha = 0.1, c = "pink") {
				translate(v = [-10, 10, 23]) {
					cube(size = [1, 1, 1]);
				}
			}
			/*Node $_162*/
			color(alpha = 0.1, c = "pink") {
				translate(v = [-10, 10, 19]) {
					cube(size = [1, 1, 1]);
				}
			}
			/*Node $_163*/
			color(alpha = 0.1, c = "pink") {
				translate(v = [-10, 6, 21]) {
					cube(size = [1, 1, 1]);
				}
			}
		}
		/*Edges shell 8*/
		union() {
			/*Edge 84 from thingy.collect_pinholes[0].hole to $_84*/
			translate(v = [-4.5, 10.5, 25.5]) {
				rotate(a = [0, 90.0, 135.0]) {
					cube(size = [0.125, 0.125, 1.4142135623730951]);
				}
			}
			/*Edge 85 from thingy.collect_pinholes[1].hole to $_85*/
			translate(v = [-0.5, 10.5, 23.5]) {
				rotate(a = [0, 54.735610317245346, 45.0]) {
					cube(size = [0.125, 0.125, 1.7320508075688772]);
				}
			}
			/*Edge 86 from thingy.collect_pinholes[2].hole to $_86*/
			translate(v = [0.5, 10.5, 19.5]) {
				rotate(a = [0, 125.26438968275465, 45.0]) {
					cube(size = [0.125, 0.125, 1.7320508075688772]);
				}
			}
			/*Edge 87 from thingy.collect_pinholes[3].hole to $_87*/
			translate(v = [0.5, 10.5, 23.5]) {
				rotate(a = [0, 54.735610317245346, 45.0]) {
					cube(size = [0.125, 0.125, 1.7320508075688772]);
				}
			}
			/*Edge 88 from thingy.collect_pinholes[4].hole to $_88*/
			translate(v = [-3.5, 10.5, 19.5]) {
				rotate(a = [0, 135.0, 90.0]) {
					cube(size = [0.125, 0.125, 1.4142135623730951]);
				}
			}
			/*Edge 89 from thingy.collect_pinholes[5].hole to $_89*/
			translate(v = [-1.5, 10.5, 23.5]) {
				rotate(a = [0, 90.0, 45.0]) {
					cube(size = [0.125, 0.125, 1.4142135623730951]);
				}
			}
			/*Edge 90 from thingy.collect_pinholes[6].hole to $_90*/
			translate(v = [-5.5, 10.5, 25.5]) {
				rotate(a = [0, 90.0, 135.0]) {
					cube(size = [0.125, 0.125, 1.4142135623730951]);
				}
			}
			/*Edge 91 from thingy.collect_pinholes[7].hole to $_91*/
			translate(v = [-9.5, 10.5, 21.5]) {
				rotate(a = [0, 125.26438968275465, 135.0]) {
					cube(size = [0.125, 0.125, 1.7320508075688772]);
				}
			}
			/*Edge 92 from thingy.collect_pinholes[8].hole to $_92*/
			translate(v = [-5.5, 10.5, 24.5]) {
				rotate(a = [0, 54.735610317245346, 45.0]) {
					cube(size = [0.125, 0.125, 1.7320508075688772]);
				}
			}
			/*Edge 93 from thingy.collect_pinholes[9].hole to $_93*/
			translate(v = [-9.5, 10.5, 20.5]) {
				rotate(a = [0, 125.26438968275465, 135.0]) {
					cube(size = [0.125, 0.125, 1.7320508075688772]);
				}
			}
			/*Edge 133 from thingy.hole to $_133*/
			translate(v = [-9.5, 5.5, 19.5]) {
				rotate(a = [0, 90.0, -135.0]) {
					cube(size = [0.125, 0.125, 1.4142135623730951]);
				}
			}
			/*Edge 134 from thingy.prep_inlet_pinholes[0].hole to $_134*/
			translate(v = [-8.5, 10.5, 24.5]) {
				rotate(a = [0, 54.735610317245346, 45.0]) {
					cube(size = [0.125, 0.125, 1.7320508075688772]);
				}
			}
			/*Edge 135 from thingy.prep_inlet_pinholes[1].hole to $_135*/
			translate(v = [-5.5, 10.5, 20.5]) {
				rotate(a = [0, 125.26438968275465, 45.0]) {
					cube(size = [0.125, 0.125, 1.7320508075688772]);
				}
			}
			/*Edge 136 from thingy.prep_inlet_pinholes[2].hole to $_136*/
			translate(v = [-9.5, 6.5, 24.5]) {
				rotate(a = [0, 54.735610317245346, -135.0]) {
					cube(size = [0.125, 0.125, 1.7320508075688772]);
				}
			}
			/*Edge 137 from thingy.prep_inlet_pinholes[3].hole to $_137*/
			translate(v = [-9.5, 6.5, 20.5]) {
				rotate(a = [0, 125.26438968275465, -135.0]) {
					cube(size = [0.125, 0.125, 1.7320508075688772]);
				}
			}
			/*Edge 138 from thingy.prep_inlet_pinholes[4].hole to $_138*/
			translate(v = [-9.5, 10.5, 24.5]) {
				rotate(a = [0, 54.735610317245346, 135.0]) {
					cube(size = [0.125, 0.125, 1.7320508075688772]);
				}
			}
			/*Edge 139 from thingy.prep_outlet_pinholes[0].hole to $_139*/
			translate(v = [-3.5, 10.5, 25.5]) {
				rotate(a = [0, 90.0, 45.0]) {
					cube(size = [0.125, 0.125, 1.4142135623730951]);
				}
			}
			/*Edge 140 from thingy.prep_outlet_pinholes[1].hole to $_140*/
			translate(v = [-9.5, 10.5, 25.5]) {
				rotate(a = [0, 125.26438968275465, 135.0]) {
					cube(size = [0.125, 0.125, 1.7320508075688772]);
				}
			}
			/*Edge 144 from thingy.ring_inlet_pinholes[0].hole to $_144*/
			translate(v = [-9.5, 7.5, 23.5]) {
				rotate(a = [0, 35.26438968275464, 135.0]) {
					cube(size = [0.125, 0.125, 2.449489742783178]);
				}
			}
			/*Edge 145 from thingy.ring_inlet_pinholes[1].hole to $_145*/
			translate(v = [-9.5, 3.5, 23.5]) {
				rotate(a = [0, 35.26438968275464, -135.0]) {
					cube(size = [0.125, 0.125, 2.449489742783178]);
				}
			}
			/*Edge 146 from thingy.ring_inlet_pinholes[2].hole to $_146*/
			translate(v = [-9.5, 4.5, 20.5]) {
				rotate(a = [0, 125.26438968275465, -135.0]) {
					cube(size = [0.125, 0.125, 1.7320508075688772]);
				}
			}
			/*Edge 147 from thingy.ring_inlet_pinholes[3].hole to $_147*/
			translate(v = [-9.5, 8.5, 16.5]) {
				rotate(a = [0, 154.7605981793211, 135.0]) {
					cube(size = [0.125, 0.125, 3.3166247903554]);
				}
			}
			/*Edge 148 from thingy.ring_inlet_pinholes[4].hole to $_148*/
			translate(v = [-9.5, 4.5, 16.5]) {
				rotate(a = [0, 125.26438968275465, -135.0]) {
					cube(size = [0.125, 0.125, 1.7320508075688772]);
				}
			}
			/*Edge 149 from thingy.ring_inlet_pinholes[5].hole to $_149*/
			translate(v = [-9.5, 5.5, 20.5]) {
				rotate(a = [0, 54.735610317245346, -135.0]) {
					cube(size = [0.125, 0.125, 1.7320508075688772]);
				}
			}
			/*Edge 150 from thingy.ring_inlet_pinholes[6].hole to $_150*/
			translate(v = [-9.5, 9.5, 16.5]) {
				rotate(a = [0, 125.26438968275465, 135.0]) {
					cube(size = [0.125, 0.125, 1.7320508075688772]);
				}
			}
			/*Edge 151 from thingy.ring_inlet_pinholes[7].hole to $_151*/
			translate(v = [-9.5, 5.5, 17.5]) {
				rotate(a = [0, 125.26438968275465, -135.0]) {
					cube(size = [0.125, 0.125, 1.7320508075688772]);
				}
			}
			/*Edge 152 from thingy.ring_inlet_pinholes[8].hole to $_152*/
			translate(v = [-9.5, 9.5, 15.5]) {
				rotate(a = [0, 125.26438968275465, 135.0]) {
					cube(size = [0.125, 0.125, 1.7320508075688772]);
				}
			}
			/*Edge 153 from thingy.ring_inlet_pinholes[9].hole to $_153*/
			translate(v = [-9.5, 8.5, 15.5]) {
				rotate(a = [0, 131.81031489577862, 116.56505117707799]) {
					cube(size = [0.125, 0.125, 3.0]);
				}
			}
			/*Edge 154 from thingy.ring_outlet_pinholes[0].hole to $_154*/
			translate(v = [-9.5, 1.5, 24.5]) {
				rotate(a = [0, 54.735610317245346, -135.0]) {
					cube(size = [0.125, 0.125, 1.7320508075688772]);
				}
			}
			/*Edge 155 from thingy.ring_outlet_pinholes[1].hole to $_155*/
			translate(v = [-9.5, 5.5, 24.5]) {
				rotate(a = [0, 54.735610317245346, 135.0]) {
					cube(size = [0.125, 0.125, 1.7320508075688772]);
				}
			}
			/*Edge 156 from thingy.ring_outlet_pinholes[2].hole to $_156*/
			translate(v = [-9.5, 9.5, 24.5]) {
				rotate(a = [0, 114.09484255211072, 116.56505117707799]) {
					cube(size = [0.125, 0.125, 2.449489742783178]);
				}
			}
			/*Edge 157 from thingy.ring_outlet_pinholes[3].hole to $_157*/
			translate(v = [-9.5, 10.5, 22.5]) {
				rotate(a = [0, 125.26438968275465, 135.0]) {
					cube(size = [0.125, 0.125, 1.7320508075688772]);
				}
			}
			/*Edge 158 from thingy.ring_outlet_pinholes[4].hole to $_158*/
			translate(v = [-5.5, 10.5, 22.5]) {
				rotate(a = [0, 54.735610317245346, 45.0]) {
					cube(size = [0.125, 0.125, 1.7320508075688772]);
				}
			}
			/*Edge 159 from thingy.ring_outlet_pinholes[5].hole to $_159*/
			translate(v = [-8.5, 10.5, 23.5]) {
				rotate(a = [0, 54.735610317245346, 135.0]) {
					cube(size = [0.125, 0.125, 1.7320508075688772]);
				}
			}
			/*Edge 160 from thingy.ring_outlet_pinholes[6].hole to $_160*/
			translate(v = [-9.5, 6.5, 19.5]) {
				rotate(a = [0, 125.26438968275465, -135.0]) {
					cube(size = [0.125, 0.125, 1.7320508075688772]);
				}
			}
			/*Edge 161 from thingy.ring_outlet_pinholes[7].hole to $_161*/
			translate(v = [-9.5, 10.5, 23.5]) {
				rotate(a = [0, 45.00000000000001, 180.0]) {
					cube(size = [0.125, 0.125, 1.4142135623730951]);
				}
			}
			/*Edge 162 from thingy.ring_outlet_pinholes[8].hole to $_162*/
			translate(v = [-9.5, 10.5, 19.5]) {
				rotate(a = [0, 125.26438968275465, 135.0]) {
					cube(size = [0.125, 0.125, 1.7320508075688772]);
				}
			}
			/*Edge 163 from thingy.ring_outlet_pinholes[9].hole to $_163*/
			translate(v = [-9.5, 6.5, 21.5]) {
				rotate(a = [0, 90.0, -135.0]) {
					cube(size = [0.125, 0.125, 1.4142135623730951]);
				}
			}
		}
	}
	/*Shell 9*/
	union() {
		%/*Nodes shell 9*/
		union() {
			/*Node thingy.collect_pinholes[0].hole*/
			color(alpha = 0.1, c = "black") {
				translate(v = [-6, 11, 25]) {
					cube(size = [1, 1, 1]);
				}
			}
			/*Node thingy.collect_pinholes[1].hole*/
			color(alpha = 0.1, c = "black") {
				translate(v = [0, 11, 24]) {
					cube(size = [1, 1, 1]);
				}
			}
			/*Node thingy.collect_pinholes[2].hole*/
			color(alpha = 0.1, c = "black") {
				translate(v = [1, 11, 18]) {
					cube(size = [1, 1, 1]);
				}
			}
			/*Node thingy.collect_pinholes[3].hole*/
			color(alpha = 0.1, c = "black") {
				translate(v = [1, 11, 24]) {
					cube(size = [1, 1, 1]);
				}
			}
			/*Node thingy.collect_pinholes[4].hole*/
			color(alpha = 0.1, c = "black") {
				translate(v = [-4, 11, 18]) {
					cube(size = [1, 1, 1]);
				}
			}
			/*Node thingy.collect_pinholes[5].hole*/
			color(alpha = 0.1, c = "black") {
				translate(v = [-1, 11, 23]) {
					cube(size = [1, 1, 1]);
				}
			}
			/*Node thingy.collect_pinholes[6].hole*/
			color(alpha = 0.1, c = "black") {
				translate(v = [-7, 11, 25]) {
					cube(size = [1, 1, 1]);
				}
			}
			/*Node thingy.collect_pinholes[7].hole*/
			color(alpha = 0.1, c = "black") {
				translate(v = [-11, 11, 20]) {
					cube(size = [1, 1, 1]);
				}
			}
			/*Node thingy.collect_pinholes[8].hole*/
			color(alpha = 0.1, c = "black") {
				translate(v = [-5, 11, 25]) {
					cube(size = [1, 1, 1]);
				}
			}
			/*Node thingy.collect_pinholes[9].hole*/
			color(alpha = 0.1, c = "black") {
				translate(v = [-11, 11, 19]) {
					cube(size = [1, 1, 1]);
				}
			}
			/*Node thingy.hole*/
			color(alpha = 0.1, c = "black") {
				translate(v = [-11, 4, 19]) {
					cube(size = [1, 1, 1]);
				}
			}
			/*Node thingy.prep_inlet_pinholes[0].hole*/
			color(alpha = 0.1, c = "black") {
				translate(v = [-8, 11, 25]) {
					cube(size = [1, 1, 1]);
				}
			}
			/*Node thingy.prep_inlet_pinholes[1].hole*/
			color(alpha = 0.1, c = "black") {
				translate(v = [-5, 11, 19]) {
					cube(size = [1, 1, 1]);
				}
			}
			/*Node thingy.prep_inlet_pinholes[2].hole*/
			color(alpha = 0.1, c = "black") {
				translate(v = [-11, 5, 25]) {
					cube(size = [1, 1, 1]);
				}
			}
			/*Node thingy.prep_inlet_pinholes[3].hole*/
			color(alpha = 0.1, c = "black") {
				translate(v = [-11, 5, 19]) {
					cube(size = [1, 1, 1]);
				}
			}
			/*Node thingy.prep_inlet_pinholes[4].hole*/
			color(alpha = 0.1, c = "black") {
				translate(v = [-11, 11, 25]) {
					cube(size = [1, 1, 1]);
				}
			}
			/*Node thingy.prep_outlet_pinholes[0].hole*/
			color(alpha = 0.1, c = "black") {
				translate(v = [-3, 11, 25]) {
					cube(size = [1, 1, 1]);
				}
			}
			/*Node thingy.prep_outlet_pinholes[1].hole*/
			color(alpha = 0.1, c = "black") {
				translate(v = [-11, 11, 24]) {
					cube(size = [1, 1, 1]);
				}
			}
			/*Node thingy.ring_inlet_pinholes[0].hole*/
			color(alpha = 0.1, c = "black") {
				translate(v = [-11, 8, 25]) {
					cube(size = [1, 1, 1]);
				}
			}
			/*Node thingy.ring_inlet_pinholes[1].hole*/
			color(alpha = 0.1, c = "black") {
				translate(v = [-11, 2, 25]) {
					cube(size = [1, 1, 1]);
				}
			}
			/*Node thingy.ring_inlet_pinholes[2].hole*/
			color(alpha = 0.1, c = "black") {
				translate(v = [-11, 3, 19]) {
					cube(size = [1, 1, 1]);
				}
			}
			/*Node thingy.ring_inlet_pinholes[3].hole*/
			color(alpha = 0.1, c = "black") {
				translate(v = [-11, 9, 13]) {
					cube(size = [1, 1, 1]);
				}
			}
			/*Node thingy.ring_inlet_pinholes[4].hole*/
			color(alpha = 0.1, c = "black") {
				translate(v = [-11, 3, 15]) {
					cube(size = [1, 1, 1]);
				}
			}
			/*Node thingy.ring_inlet_pinholes[5].hole*/
			color(alpha = 0.1, c = "black") {
				translate(v = [-11, 4, 21]) {
					cube(size = [1, 1, 1]);
				}
			}
			/*Node thingy.ring_inlet_pinholes[6].hole*/
			color(alpha = 0.1, c = "black") {
				translate(v = [-11, 10, 15]) {
					cube(size = [1, 1, 1]);
				}
			}
			/*Node thingy.ring_inlet_pinholes[7].hole*/
			color(alpha = 0.1, c = "black") {
				translate(v = [-11, 4, 16]) {
					cube(size = [1, 1, 1]);
				}
			}
			/*Node thingy.ring_inlet_pinholes[8].hole*/
			color(alpha = 0.1, c = "black") {
				translate(v = [-11, 10, 14]) {
					cube(size = [1, 1, 1]);
				}
			}
			/*Node thingy.ring_inlet_pinholes[9].hole*/
			color(alpha = 0.1, c = "black") {
				translate(v = [-11, 10, 13]) {
					cube(size = [1, 1, 1]);
				}
			}
			/*Node thingy.ring_outlet_pinholes[0].hole*/
			color(alpha = 0.1, c = "black") {
				translate(v = [-11, 0, 25]) {
					cube(size = [1, 1, 1]);
				}
			}
			/*Node thingy.ring_outlet_pinholes[1].hole*/
			color(alpha = 0.1, c = "black") {
				translate(v = [-11, 6, 25]) {
					cube(size = [1, 1, 1]);
				}
			}
			/*Node thingy.ring_outlet_pinholes[2].hole*/
			color(alpha = 0.1, c = "black") {
				translate(v = [-11, 11, 23]) {
					cube(size = [1, 1, 1]);
				}
			}
			/*Node thingy.ring_outlet_pinholes[3].hole*/
			color(alpha = 0.1, c = "black") {
				translate(v = [-11, 11, 21]) {
					cube(size = [1, 1, 1]);
				}
			}
			/*Node thingy.ring_outlet_pinholes[4].hole*/
			color(alpha = 0.1, c = "black") {
				translate(v = [-5, 11, 23]) {
					cube(size = [1, 1, 1]);
				}
			}
			/*Node thingy.ring_outlet_pinholes[5].hole*/
			color(alpha = 0.1, c = "black") {
				translate(v = [-10, 11, 24]) {
					cube(size = [1, 1, 1]);
				}
			}
			/*Node thingy.ring_outlet_pinholes[6].hole*/
			color(alpha = 0.1, c = "black") {
				translate(v = [-11, 5, 18]) {
					cube(size = [1, 1, 1]);
				}
			}
			/*Node thingy.ring_outlet_pinholes[7].hole*/
			color(alpha = 0.1, c = "black") {
				translate(v = [-11, 10, 24]) {
					cube(size = [1, 1, 1]);
				}
			}
			/*Node thingy.ring_outlet_pinholes[8].hole*/
			color(alpha = 0.1, c = "black") {
				translate(v = [-11, 11, 18]) {
					cube(size = [1, 1, 1]);
				}
			}
			/*Node thingy.ring_outlet_pinholes[9].hole*/
			color(alpha = 0.1, c = "black") {
				translate(v = [-11, 5, 21]) {
					cube(size = [1, 1, 1]);
				}
			}
		}
		/*Edges shell 9*/
		union();
	}
	/*Shell 10*/
	union() {
		%/*Nodes shell 10*/
		union();
		/*Edges shell 10*/
		union();
	}
}
